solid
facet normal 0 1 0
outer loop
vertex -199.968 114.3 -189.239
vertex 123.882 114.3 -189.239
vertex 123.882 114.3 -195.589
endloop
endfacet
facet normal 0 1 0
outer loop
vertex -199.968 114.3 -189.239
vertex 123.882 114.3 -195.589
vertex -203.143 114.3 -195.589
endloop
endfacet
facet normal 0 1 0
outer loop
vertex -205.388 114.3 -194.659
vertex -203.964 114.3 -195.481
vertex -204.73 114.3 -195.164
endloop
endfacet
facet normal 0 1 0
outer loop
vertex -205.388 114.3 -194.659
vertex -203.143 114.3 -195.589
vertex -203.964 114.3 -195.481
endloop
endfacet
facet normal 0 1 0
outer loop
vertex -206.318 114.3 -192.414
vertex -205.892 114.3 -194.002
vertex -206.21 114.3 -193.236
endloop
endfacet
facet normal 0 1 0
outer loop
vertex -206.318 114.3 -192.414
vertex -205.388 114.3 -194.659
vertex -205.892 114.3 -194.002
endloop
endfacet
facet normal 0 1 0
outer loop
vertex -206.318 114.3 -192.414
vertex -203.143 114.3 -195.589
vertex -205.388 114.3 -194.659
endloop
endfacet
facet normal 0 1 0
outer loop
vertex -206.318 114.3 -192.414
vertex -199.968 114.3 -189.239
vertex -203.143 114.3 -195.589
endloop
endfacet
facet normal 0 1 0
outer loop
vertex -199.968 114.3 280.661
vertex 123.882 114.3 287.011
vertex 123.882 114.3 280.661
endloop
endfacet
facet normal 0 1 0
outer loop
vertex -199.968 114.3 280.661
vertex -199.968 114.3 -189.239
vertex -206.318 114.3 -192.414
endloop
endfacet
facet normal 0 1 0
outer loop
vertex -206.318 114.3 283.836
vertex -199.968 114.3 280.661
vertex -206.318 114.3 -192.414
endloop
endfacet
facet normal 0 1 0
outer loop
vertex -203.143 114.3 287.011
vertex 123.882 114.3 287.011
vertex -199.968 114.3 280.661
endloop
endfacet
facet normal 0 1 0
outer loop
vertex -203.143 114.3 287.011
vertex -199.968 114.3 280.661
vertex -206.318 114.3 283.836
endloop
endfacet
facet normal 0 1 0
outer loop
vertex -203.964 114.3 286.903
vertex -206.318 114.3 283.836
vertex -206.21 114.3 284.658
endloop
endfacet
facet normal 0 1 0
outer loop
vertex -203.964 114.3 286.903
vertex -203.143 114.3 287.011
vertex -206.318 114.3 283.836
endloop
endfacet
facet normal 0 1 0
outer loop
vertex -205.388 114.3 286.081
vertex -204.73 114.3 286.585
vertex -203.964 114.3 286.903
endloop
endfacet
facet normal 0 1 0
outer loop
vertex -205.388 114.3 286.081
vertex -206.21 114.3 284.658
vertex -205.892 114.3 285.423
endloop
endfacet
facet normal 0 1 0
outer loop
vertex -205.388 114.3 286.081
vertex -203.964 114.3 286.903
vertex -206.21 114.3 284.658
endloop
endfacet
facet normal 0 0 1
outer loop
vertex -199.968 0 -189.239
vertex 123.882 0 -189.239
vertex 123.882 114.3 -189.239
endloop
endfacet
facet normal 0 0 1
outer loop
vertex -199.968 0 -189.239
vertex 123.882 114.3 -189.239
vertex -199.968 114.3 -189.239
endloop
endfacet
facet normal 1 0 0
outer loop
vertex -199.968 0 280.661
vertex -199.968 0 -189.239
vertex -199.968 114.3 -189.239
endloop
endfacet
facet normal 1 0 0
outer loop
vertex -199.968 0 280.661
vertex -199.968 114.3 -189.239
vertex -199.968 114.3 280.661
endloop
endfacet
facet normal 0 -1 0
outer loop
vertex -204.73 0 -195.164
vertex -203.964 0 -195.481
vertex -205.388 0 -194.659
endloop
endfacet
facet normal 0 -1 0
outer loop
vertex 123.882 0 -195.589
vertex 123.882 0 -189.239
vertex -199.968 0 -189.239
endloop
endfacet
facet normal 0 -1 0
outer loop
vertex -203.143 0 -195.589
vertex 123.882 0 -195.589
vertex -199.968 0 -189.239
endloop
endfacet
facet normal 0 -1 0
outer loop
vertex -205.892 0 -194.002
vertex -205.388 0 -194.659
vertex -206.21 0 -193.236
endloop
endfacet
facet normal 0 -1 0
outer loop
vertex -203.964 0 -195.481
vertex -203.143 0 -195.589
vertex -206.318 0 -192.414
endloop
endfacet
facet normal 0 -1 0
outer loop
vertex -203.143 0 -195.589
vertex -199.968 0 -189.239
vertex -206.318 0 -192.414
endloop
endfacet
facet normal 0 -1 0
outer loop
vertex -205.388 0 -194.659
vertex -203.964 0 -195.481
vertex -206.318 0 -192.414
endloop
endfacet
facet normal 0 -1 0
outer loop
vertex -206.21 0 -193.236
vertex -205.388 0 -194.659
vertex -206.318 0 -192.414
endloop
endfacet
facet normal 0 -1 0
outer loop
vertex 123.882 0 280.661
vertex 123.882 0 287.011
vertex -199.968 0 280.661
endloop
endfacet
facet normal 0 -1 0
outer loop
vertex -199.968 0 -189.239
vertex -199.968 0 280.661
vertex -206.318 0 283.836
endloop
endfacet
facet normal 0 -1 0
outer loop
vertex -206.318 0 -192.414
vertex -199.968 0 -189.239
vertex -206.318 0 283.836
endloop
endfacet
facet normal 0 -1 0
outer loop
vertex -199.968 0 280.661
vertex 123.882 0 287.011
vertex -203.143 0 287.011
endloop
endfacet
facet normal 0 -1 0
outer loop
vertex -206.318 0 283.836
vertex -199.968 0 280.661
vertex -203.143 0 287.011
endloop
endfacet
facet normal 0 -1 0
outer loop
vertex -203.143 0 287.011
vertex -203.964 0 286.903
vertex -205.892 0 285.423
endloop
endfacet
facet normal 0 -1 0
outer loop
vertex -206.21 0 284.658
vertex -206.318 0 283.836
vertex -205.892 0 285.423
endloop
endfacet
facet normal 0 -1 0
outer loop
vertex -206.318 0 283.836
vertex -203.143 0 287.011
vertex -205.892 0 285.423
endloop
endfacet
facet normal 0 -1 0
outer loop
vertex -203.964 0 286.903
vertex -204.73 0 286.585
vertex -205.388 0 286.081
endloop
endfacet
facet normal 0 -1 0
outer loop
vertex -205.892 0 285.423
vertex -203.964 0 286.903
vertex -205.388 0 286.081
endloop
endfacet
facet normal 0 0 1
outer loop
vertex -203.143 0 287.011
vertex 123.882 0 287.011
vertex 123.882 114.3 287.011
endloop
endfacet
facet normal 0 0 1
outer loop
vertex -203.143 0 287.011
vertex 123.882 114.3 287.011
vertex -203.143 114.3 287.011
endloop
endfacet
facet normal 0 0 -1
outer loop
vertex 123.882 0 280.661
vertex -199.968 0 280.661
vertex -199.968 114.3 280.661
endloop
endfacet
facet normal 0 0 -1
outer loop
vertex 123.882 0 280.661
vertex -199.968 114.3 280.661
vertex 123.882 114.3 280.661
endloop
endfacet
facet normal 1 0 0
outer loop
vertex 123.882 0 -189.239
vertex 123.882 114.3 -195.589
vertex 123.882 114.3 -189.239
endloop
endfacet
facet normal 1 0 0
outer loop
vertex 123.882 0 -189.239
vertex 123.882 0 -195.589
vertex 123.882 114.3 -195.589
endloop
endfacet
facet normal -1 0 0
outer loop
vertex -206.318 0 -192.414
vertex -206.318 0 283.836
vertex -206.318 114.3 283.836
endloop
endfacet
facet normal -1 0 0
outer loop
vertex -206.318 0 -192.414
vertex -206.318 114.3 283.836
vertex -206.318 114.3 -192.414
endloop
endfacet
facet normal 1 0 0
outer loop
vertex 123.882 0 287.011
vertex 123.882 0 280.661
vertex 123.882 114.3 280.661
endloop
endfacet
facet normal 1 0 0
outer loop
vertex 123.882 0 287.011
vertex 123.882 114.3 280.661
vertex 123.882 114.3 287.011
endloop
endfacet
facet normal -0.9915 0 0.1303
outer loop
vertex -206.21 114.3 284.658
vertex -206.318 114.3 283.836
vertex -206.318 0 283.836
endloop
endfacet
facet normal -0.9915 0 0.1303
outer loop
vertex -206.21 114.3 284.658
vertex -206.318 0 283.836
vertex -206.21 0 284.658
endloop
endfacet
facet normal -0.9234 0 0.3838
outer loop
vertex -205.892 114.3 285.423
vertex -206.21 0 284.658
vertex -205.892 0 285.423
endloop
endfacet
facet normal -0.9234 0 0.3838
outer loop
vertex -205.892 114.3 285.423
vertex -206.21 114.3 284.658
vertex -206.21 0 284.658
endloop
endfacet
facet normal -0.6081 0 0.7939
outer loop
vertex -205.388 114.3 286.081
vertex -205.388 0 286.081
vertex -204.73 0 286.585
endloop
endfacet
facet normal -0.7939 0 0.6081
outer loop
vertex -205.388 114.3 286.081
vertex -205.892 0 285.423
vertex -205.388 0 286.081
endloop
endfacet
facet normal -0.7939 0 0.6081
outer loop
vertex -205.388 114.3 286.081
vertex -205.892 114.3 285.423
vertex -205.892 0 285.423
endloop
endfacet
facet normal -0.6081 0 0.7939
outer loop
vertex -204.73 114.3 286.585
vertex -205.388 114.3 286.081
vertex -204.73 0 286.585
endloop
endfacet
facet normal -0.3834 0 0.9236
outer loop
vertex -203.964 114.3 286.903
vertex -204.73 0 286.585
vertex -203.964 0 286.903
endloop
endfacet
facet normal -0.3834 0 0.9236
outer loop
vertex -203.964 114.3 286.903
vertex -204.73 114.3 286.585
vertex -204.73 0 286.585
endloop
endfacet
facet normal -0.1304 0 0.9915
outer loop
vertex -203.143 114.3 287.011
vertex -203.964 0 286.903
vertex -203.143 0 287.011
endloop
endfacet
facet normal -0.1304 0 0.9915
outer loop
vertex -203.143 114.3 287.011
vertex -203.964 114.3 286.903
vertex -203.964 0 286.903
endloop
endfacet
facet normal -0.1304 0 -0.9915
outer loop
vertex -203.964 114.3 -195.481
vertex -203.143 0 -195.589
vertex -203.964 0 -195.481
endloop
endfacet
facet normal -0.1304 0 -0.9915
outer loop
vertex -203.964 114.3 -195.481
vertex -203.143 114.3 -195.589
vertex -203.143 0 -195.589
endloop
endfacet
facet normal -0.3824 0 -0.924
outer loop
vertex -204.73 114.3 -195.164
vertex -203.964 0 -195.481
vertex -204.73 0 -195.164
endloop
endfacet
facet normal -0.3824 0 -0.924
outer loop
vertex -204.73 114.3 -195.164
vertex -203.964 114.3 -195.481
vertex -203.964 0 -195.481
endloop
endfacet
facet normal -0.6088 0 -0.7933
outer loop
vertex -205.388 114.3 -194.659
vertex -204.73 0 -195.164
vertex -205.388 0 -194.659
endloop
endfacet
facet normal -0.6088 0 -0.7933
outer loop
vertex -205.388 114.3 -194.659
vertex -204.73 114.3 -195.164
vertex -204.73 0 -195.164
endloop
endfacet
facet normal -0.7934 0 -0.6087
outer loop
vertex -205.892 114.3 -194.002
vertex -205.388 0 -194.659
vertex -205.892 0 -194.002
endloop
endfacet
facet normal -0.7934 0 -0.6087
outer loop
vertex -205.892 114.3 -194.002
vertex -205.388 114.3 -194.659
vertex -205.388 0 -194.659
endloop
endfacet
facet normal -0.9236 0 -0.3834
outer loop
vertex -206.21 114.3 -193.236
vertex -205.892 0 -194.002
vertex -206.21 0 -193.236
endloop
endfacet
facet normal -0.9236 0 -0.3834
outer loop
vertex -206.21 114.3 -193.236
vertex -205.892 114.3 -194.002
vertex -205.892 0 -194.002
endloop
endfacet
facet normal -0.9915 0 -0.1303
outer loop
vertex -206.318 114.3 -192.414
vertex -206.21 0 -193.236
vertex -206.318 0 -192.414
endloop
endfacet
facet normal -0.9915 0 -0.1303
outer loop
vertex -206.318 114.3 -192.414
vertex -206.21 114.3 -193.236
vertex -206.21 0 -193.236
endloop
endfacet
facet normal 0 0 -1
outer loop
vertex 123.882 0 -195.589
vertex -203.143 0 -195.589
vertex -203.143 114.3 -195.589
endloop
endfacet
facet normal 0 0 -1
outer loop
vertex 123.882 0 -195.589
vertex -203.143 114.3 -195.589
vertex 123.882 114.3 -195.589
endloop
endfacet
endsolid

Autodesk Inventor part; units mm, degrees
ref_plane "YZ Plane" through (0, 0, 0) normal (1, 0, 0) x (0, 1, 0)
ref_plane "XZ Plane" through (0, 0, 0) normal (0, 1, 0) x (-1, 0, 0)
ref_plane "XY Plane" through (0, 0, 0) normal (0, 0, 1) x (1, 0, 0)
sketch "Sketch1" plane through (0, 0, 0) normal (0, 1, 0) x (-1, 0, 0)
  line L0 (199.9677, 280.6608) -> (-123.8823, 280.6608)
  line L1 (-123.8823, 280.6608) -> (-123.8823, 287.0108)
  line L2 (-123.8823, 287.0108) -> (206.3177, 287.0108)
  line L3 (206.3177, 287.0108) -> (206.3177, -195.5892)
  line L4 (206.3177, -195.5892) -> (-123.8823, -195.5892)
  line L5 (-123.8823, -195.5892) -> (-123.8823, -189.2392)
  line L6 (-123.8823, -189.2392) -> (199.9677, -189.2392)
  line L7 (199.9677, -189.2392) -> (199.9677, 280.6608)
  point P0 (0, 0)
  dimension "d0" = 482.6
  dimension "d1" = 330.2
  dimension "d2" = 6.35
  dimension "d3" = 6.35
  dimension "d4" = 6.35
extrude "Extrusion1" add sketch "Sketch1" along normal blind 114.3
fillet "Fillet1" radius 3.175 2 edges at (-206.3177, 57.15, 287.0108) (-206.3177, 57.15, -195.5892)
properties part number "Visor"
